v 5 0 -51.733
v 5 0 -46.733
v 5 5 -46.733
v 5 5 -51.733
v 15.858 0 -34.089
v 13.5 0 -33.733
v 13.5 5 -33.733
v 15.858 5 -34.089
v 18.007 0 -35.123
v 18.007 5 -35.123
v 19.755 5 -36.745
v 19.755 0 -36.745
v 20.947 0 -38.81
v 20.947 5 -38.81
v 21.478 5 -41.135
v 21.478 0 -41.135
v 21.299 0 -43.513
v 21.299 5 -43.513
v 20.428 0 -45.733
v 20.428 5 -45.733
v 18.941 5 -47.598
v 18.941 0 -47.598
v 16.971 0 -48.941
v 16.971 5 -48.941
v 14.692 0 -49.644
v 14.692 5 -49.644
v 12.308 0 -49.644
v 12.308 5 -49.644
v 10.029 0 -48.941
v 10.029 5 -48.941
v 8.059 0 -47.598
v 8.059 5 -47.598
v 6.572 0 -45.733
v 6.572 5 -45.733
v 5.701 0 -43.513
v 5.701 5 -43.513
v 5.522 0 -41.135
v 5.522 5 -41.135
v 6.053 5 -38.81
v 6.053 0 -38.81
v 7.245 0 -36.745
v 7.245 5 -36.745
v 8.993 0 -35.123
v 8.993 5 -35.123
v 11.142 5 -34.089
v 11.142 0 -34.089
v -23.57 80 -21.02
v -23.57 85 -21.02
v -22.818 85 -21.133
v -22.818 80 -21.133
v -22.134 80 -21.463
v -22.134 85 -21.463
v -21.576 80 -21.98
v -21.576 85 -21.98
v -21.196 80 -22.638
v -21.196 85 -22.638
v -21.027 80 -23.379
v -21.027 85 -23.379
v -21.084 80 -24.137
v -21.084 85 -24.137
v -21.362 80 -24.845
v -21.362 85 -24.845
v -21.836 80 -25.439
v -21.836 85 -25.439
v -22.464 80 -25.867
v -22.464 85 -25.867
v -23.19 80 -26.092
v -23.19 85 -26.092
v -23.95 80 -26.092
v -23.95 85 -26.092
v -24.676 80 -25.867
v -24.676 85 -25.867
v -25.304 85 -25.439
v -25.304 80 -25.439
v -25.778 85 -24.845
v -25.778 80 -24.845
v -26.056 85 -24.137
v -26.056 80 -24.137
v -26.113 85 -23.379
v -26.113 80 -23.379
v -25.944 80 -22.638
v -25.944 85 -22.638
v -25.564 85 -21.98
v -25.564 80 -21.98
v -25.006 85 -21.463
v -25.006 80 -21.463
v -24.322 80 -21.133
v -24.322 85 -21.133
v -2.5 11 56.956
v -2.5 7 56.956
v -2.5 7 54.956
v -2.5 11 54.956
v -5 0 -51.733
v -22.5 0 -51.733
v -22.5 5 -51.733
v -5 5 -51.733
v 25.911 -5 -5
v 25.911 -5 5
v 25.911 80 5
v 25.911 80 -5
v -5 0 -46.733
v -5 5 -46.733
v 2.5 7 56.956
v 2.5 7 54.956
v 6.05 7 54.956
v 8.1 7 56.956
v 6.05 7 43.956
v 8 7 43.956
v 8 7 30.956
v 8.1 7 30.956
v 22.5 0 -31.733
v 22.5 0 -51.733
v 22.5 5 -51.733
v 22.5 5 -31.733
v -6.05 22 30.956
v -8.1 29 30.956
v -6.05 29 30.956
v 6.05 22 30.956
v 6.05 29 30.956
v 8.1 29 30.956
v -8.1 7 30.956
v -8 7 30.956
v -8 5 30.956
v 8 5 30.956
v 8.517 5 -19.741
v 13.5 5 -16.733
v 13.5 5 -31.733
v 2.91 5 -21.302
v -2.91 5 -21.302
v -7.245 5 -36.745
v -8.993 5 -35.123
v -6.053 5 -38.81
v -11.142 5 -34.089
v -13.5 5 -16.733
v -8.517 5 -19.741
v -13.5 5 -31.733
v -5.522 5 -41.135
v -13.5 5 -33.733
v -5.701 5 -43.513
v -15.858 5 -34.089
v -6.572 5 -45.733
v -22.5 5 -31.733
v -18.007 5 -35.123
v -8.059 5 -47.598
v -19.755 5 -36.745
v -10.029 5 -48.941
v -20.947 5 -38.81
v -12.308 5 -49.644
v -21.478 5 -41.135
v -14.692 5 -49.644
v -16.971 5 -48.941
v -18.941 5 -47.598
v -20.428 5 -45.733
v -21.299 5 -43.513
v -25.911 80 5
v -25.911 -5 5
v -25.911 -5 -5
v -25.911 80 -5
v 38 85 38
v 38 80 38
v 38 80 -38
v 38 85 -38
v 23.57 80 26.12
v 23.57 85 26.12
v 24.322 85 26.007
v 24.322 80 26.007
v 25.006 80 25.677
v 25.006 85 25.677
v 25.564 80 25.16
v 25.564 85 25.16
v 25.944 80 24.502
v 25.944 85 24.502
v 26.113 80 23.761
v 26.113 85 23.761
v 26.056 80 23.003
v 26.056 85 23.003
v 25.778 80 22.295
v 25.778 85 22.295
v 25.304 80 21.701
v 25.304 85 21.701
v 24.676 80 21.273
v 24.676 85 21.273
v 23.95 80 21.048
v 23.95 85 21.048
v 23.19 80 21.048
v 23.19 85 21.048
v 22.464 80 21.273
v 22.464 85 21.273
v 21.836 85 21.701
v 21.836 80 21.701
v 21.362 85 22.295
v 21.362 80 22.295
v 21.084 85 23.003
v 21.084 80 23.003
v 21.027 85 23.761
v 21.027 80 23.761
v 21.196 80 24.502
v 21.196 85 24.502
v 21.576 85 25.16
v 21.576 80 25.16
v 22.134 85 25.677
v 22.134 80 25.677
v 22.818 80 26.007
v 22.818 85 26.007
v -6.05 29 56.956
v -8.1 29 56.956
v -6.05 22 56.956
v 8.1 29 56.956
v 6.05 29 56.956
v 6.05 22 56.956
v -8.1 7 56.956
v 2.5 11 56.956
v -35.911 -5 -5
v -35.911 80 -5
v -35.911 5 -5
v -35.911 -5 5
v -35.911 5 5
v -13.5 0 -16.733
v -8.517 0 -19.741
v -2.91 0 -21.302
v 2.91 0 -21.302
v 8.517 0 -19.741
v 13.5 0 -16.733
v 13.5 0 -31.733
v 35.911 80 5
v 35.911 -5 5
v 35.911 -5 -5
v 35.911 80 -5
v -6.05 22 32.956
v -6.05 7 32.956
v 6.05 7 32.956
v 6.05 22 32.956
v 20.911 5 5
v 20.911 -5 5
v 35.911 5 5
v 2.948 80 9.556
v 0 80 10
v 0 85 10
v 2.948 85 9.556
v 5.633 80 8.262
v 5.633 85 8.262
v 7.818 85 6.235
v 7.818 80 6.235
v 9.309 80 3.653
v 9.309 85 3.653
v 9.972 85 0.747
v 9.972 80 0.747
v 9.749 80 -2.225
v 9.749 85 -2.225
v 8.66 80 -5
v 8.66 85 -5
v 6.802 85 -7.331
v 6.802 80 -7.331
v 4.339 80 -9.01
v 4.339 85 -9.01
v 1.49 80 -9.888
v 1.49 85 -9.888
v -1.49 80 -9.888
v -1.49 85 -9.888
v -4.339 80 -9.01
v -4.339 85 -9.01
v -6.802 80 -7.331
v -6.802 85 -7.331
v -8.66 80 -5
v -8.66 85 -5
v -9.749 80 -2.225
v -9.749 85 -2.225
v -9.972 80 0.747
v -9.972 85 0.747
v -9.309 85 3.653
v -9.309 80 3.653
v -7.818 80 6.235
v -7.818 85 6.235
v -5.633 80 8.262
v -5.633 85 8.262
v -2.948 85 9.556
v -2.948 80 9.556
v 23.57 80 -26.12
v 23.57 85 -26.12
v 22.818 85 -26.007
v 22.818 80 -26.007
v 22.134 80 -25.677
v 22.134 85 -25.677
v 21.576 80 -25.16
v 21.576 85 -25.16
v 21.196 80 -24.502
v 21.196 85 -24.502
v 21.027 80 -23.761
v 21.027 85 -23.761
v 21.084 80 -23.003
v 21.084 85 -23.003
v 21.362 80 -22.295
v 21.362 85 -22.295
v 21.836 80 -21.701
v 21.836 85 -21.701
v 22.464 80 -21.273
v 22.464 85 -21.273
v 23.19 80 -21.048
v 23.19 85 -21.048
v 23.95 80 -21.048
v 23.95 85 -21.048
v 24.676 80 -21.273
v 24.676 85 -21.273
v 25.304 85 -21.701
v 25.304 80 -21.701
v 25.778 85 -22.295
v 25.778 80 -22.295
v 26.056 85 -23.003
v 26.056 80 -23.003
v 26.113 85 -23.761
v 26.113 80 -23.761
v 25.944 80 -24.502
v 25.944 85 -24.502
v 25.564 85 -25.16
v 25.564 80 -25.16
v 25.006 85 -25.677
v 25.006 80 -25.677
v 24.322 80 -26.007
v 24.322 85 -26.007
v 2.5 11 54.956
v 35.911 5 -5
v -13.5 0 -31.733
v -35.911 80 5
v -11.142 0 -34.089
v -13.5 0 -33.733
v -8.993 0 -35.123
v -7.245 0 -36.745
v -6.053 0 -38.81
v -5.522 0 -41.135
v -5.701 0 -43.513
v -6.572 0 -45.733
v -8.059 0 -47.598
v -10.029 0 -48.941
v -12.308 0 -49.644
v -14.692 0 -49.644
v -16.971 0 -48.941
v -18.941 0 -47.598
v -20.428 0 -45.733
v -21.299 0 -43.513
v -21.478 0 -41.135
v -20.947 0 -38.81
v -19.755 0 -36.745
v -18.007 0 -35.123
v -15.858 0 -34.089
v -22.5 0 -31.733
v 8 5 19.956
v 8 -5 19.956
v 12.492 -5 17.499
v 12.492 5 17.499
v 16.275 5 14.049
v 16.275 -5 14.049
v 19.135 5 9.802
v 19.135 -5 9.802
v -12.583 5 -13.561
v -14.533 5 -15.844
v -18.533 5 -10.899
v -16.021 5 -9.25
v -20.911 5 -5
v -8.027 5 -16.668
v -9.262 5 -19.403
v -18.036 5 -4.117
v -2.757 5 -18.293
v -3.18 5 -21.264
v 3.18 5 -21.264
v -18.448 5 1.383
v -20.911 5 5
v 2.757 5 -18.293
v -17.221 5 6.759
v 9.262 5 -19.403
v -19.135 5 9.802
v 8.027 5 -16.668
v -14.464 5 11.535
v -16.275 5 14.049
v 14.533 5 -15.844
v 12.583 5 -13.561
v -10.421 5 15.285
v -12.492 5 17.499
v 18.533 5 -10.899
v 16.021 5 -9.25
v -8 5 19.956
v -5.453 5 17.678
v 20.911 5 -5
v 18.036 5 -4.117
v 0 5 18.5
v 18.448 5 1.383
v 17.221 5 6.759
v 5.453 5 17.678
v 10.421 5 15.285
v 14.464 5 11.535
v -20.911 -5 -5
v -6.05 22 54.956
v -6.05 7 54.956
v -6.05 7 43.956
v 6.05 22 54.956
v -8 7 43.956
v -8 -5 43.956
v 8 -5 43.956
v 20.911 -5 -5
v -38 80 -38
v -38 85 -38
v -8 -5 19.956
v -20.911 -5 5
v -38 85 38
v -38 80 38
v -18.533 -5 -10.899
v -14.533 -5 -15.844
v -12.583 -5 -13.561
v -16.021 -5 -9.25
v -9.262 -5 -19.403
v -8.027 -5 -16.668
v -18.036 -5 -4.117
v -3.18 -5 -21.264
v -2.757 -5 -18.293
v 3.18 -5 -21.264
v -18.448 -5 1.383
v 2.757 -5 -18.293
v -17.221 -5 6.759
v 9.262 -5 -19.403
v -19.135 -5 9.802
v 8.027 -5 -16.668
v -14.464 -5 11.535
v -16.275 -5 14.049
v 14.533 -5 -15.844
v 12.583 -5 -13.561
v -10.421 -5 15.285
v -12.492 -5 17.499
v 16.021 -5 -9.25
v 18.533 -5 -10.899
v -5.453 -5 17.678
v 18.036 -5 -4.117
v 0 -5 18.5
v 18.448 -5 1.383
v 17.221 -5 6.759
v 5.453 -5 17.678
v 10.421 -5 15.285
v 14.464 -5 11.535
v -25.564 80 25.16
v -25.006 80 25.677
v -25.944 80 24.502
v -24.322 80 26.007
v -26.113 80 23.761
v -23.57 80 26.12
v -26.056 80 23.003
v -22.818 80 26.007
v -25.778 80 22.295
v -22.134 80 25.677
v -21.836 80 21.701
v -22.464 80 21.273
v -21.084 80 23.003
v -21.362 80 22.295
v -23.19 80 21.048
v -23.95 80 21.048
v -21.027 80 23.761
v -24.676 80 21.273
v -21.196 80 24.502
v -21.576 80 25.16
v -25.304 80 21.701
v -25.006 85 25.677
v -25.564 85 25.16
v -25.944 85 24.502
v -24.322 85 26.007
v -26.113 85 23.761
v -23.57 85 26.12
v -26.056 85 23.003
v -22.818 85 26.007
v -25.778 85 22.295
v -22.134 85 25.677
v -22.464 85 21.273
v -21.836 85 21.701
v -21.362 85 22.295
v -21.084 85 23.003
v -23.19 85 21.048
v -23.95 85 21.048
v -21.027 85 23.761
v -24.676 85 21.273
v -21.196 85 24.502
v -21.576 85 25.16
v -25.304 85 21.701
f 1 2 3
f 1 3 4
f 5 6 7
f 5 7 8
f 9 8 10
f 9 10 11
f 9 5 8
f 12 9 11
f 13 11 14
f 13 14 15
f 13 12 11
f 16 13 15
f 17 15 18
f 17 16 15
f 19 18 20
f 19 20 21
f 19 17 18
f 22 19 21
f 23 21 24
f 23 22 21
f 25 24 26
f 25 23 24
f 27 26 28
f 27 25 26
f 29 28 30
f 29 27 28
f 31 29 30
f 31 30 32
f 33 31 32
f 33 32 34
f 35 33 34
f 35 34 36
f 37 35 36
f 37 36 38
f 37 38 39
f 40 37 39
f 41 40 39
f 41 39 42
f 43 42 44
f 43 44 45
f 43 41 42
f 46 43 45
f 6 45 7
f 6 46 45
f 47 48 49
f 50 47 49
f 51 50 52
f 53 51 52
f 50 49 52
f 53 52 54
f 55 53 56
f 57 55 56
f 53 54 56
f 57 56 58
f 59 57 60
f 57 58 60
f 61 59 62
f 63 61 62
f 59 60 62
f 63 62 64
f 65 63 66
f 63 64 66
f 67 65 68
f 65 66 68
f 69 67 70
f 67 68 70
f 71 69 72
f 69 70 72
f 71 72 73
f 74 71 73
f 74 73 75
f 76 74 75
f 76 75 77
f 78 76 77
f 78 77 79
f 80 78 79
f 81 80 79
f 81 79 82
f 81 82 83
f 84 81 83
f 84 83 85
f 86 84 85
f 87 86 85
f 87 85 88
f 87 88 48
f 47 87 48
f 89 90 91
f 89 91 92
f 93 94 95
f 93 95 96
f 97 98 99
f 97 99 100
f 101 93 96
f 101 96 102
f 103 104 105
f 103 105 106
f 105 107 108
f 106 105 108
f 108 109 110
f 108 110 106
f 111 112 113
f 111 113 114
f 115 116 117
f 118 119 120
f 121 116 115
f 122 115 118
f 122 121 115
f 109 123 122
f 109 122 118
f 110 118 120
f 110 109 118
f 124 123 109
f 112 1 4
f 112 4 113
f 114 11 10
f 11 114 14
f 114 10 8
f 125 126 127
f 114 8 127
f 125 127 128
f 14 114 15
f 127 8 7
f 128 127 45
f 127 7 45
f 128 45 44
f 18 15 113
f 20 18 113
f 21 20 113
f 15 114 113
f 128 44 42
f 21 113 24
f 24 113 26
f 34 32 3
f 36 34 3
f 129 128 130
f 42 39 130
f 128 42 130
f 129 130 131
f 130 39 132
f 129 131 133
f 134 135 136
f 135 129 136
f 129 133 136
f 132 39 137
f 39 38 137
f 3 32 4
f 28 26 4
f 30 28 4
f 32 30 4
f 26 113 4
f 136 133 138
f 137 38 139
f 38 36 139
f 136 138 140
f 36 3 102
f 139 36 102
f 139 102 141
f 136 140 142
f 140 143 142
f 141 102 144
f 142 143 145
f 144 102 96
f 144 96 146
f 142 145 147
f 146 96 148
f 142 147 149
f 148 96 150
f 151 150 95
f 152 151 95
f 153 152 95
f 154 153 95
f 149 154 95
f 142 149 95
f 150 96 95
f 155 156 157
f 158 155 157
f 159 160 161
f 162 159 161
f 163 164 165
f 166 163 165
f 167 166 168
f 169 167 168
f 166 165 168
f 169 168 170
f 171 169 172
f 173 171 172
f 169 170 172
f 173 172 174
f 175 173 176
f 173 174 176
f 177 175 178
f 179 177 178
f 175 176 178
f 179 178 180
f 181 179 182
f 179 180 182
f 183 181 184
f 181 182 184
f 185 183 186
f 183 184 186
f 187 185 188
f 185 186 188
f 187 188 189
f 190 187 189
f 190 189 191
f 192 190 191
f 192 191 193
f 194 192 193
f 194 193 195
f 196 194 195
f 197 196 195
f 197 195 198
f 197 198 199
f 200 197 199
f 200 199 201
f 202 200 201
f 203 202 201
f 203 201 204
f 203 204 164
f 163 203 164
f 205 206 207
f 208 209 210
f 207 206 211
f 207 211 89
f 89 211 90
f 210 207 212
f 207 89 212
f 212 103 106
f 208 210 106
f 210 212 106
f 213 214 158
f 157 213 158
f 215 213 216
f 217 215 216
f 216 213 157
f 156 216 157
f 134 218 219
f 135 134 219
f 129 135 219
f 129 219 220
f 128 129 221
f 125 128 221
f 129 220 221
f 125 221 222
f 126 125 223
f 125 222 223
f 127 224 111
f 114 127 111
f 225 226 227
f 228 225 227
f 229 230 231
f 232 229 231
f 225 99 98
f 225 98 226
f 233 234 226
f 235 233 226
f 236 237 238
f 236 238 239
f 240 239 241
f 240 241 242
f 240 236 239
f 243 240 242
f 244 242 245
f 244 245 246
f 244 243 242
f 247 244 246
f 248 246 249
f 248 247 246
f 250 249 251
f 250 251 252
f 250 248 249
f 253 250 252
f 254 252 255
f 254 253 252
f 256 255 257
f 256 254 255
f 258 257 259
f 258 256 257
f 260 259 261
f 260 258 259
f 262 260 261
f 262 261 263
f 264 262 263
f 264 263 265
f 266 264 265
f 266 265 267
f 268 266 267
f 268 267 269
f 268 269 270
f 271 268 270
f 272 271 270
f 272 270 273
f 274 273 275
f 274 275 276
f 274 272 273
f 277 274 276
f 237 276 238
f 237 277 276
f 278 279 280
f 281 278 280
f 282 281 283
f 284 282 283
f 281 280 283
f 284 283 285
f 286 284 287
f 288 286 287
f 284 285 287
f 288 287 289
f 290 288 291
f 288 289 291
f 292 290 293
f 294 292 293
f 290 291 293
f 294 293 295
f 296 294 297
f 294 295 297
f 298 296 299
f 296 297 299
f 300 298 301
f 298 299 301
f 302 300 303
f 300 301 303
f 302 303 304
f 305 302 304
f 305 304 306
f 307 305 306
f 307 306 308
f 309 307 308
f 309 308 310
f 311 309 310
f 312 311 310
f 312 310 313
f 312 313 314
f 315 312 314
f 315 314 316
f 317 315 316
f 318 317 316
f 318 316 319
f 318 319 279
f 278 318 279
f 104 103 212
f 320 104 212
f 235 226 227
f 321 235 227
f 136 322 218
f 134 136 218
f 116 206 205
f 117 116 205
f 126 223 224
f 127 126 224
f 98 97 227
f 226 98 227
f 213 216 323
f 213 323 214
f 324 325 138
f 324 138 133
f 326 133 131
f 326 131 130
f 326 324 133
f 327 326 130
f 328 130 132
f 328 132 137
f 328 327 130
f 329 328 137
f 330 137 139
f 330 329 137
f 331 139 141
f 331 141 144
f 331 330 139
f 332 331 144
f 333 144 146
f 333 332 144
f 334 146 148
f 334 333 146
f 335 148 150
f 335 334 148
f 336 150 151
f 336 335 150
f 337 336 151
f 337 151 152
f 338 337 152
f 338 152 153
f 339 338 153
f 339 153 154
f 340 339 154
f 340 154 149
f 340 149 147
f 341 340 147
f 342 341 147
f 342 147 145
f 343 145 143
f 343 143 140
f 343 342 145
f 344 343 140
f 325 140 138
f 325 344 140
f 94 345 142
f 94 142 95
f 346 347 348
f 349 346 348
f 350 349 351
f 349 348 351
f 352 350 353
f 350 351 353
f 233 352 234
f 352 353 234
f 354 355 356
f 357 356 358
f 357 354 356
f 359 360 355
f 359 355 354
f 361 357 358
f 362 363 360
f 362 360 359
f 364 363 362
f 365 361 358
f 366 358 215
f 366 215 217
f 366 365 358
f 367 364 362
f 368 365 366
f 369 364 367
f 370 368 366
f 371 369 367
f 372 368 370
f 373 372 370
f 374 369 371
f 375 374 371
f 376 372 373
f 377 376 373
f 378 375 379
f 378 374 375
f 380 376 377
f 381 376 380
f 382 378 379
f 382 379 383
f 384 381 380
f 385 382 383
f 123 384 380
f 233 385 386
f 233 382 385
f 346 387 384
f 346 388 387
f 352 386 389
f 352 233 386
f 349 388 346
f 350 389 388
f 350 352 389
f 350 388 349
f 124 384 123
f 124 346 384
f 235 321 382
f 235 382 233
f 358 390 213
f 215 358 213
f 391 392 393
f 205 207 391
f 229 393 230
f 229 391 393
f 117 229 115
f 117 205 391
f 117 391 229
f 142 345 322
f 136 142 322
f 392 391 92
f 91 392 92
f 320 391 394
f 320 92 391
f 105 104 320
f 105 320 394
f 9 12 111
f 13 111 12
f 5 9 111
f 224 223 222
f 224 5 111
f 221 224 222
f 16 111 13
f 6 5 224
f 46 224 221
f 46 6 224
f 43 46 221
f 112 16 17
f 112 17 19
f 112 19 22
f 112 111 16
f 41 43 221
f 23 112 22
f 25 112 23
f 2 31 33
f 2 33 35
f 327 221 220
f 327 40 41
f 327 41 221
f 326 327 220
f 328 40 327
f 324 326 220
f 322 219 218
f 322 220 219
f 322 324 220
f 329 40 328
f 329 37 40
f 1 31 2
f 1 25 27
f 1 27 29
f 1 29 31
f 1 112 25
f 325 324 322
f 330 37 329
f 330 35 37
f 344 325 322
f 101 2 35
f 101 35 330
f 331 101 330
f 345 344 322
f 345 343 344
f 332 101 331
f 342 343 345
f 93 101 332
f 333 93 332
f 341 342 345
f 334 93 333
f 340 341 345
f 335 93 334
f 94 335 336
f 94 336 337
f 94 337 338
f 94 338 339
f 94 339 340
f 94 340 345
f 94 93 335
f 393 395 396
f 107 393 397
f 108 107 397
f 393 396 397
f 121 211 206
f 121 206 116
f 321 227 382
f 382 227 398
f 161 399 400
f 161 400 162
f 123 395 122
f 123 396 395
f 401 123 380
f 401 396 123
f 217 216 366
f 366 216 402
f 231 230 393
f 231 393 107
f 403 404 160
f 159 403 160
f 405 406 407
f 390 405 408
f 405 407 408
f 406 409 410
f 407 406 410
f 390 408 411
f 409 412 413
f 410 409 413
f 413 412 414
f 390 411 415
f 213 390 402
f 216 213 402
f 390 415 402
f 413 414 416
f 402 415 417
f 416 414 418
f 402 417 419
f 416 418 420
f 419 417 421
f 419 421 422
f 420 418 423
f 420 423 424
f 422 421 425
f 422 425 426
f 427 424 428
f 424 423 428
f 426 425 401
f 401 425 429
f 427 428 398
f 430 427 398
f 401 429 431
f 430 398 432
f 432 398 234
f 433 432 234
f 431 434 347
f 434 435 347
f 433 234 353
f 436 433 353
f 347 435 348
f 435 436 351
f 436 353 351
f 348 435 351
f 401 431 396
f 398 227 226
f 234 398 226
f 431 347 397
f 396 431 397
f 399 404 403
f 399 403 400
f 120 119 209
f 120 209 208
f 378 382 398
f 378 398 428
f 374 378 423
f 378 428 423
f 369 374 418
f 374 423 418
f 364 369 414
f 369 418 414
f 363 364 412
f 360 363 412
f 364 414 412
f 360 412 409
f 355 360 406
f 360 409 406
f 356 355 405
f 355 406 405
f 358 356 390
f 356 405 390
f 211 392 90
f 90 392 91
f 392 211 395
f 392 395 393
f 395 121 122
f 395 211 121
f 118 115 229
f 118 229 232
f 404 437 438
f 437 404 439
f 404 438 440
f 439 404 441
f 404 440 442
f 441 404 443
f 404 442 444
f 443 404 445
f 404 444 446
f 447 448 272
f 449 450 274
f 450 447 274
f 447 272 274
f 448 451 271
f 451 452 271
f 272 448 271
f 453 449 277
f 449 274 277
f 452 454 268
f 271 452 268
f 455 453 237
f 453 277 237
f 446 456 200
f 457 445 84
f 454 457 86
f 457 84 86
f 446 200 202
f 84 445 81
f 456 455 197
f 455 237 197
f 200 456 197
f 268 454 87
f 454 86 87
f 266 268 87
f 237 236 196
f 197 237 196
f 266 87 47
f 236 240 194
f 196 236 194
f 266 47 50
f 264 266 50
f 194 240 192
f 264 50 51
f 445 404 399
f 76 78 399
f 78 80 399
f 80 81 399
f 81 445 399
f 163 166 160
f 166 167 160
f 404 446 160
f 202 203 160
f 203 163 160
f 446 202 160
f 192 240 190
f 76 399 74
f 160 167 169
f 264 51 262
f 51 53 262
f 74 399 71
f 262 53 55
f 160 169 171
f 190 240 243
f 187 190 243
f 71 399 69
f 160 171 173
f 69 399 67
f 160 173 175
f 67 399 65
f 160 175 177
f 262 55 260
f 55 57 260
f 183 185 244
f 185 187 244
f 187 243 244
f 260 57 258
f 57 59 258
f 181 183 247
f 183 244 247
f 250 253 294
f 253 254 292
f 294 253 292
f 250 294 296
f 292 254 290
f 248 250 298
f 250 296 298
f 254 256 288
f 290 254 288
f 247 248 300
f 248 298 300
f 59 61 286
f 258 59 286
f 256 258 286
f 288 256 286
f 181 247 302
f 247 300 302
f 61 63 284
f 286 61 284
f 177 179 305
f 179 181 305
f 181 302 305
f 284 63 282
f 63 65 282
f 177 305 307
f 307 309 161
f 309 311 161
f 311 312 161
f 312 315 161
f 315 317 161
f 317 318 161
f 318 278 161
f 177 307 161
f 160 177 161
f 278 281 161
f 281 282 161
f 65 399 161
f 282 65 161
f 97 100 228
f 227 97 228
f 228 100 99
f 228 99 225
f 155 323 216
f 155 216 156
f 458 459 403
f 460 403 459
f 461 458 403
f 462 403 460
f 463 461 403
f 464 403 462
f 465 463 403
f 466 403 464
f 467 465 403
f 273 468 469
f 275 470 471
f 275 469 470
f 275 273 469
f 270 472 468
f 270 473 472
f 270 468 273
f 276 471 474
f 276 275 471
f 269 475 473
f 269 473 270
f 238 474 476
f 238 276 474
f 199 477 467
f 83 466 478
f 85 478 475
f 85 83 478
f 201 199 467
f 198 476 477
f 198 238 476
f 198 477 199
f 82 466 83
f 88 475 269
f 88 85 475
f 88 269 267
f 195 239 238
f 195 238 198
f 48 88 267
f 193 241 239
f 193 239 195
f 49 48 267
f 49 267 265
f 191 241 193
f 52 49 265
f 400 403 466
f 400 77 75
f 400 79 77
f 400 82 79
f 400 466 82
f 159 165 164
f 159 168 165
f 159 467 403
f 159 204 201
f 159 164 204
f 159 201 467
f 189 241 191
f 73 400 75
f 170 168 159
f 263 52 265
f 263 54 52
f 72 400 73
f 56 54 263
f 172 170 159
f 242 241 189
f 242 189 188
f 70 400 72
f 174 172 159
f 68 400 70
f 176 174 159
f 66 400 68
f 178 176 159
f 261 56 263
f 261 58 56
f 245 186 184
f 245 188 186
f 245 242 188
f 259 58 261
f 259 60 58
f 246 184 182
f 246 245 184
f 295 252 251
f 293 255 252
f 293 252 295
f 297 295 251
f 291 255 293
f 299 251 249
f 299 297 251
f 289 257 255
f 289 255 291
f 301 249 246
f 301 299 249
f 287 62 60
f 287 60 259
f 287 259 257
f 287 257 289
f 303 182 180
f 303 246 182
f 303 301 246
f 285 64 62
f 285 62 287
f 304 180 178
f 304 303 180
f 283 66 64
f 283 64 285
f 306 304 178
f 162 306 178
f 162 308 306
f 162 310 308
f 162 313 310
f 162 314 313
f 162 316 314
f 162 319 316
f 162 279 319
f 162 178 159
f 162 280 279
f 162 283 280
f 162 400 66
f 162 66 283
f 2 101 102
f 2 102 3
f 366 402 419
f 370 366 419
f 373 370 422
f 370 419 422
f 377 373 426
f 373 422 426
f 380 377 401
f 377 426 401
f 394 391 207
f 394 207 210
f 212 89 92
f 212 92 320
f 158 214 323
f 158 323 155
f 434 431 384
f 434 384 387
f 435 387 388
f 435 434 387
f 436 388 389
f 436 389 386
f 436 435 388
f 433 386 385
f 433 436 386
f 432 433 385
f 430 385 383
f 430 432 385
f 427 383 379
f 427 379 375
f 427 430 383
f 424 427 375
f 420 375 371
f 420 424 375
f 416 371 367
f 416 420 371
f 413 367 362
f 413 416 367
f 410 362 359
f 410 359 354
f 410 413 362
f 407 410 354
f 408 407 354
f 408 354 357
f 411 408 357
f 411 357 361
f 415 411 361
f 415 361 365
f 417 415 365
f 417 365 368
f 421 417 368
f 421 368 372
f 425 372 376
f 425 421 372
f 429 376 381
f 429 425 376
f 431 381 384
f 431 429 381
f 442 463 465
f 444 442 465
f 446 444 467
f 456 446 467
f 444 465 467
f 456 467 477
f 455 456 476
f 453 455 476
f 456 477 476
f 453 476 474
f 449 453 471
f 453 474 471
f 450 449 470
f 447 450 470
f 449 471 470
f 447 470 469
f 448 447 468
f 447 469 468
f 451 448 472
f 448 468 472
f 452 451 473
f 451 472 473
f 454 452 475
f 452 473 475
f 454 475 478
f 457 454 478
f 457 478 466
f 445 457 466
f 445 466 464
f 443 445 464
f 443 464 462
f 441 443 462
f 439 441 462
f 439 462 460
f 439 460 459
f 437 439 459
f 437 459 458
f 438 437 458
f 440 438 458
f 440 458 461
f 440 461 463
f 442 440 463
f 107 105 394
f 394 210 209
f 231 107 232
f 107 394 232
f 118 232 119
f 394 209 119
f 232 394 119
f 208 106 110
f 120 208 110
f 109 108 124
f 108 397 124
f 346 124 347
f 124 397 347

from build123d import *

# Parameters (mm, degrees)
CONNECTOR_SLEEVE_DEPTH      = 5
CONNECTOR_SLEEVE_DEPTH_BACK = 5
SKETCH2_R                   = 18.5
SKETCH2_10_R                = 8
SENSOR_HOLDER_DEPTH         = 5
ARMS_START                  = -5
SKETCH2_18_W                = 10
SKETCH2_18_H                = 10
ARMS_DEPTH                  = 85
ARMS_2_DEPTH                = 85
ARMS2_START                 = -5
ARMS2_DEPTH                 = 10
SERVOHOLDER_START           = -5
SERVOHOLDER_DEPTH           = 10
SKETCH31_W                  = 16
SKETCH31_H                  = 13
SERVOHOLDER2_DEPTH          = 2
SKETCH33_W                  = 16.2
SKETCH33_H                  = 26
SKETCH33_W_2                = 12.1
SKETCH33_H_2                = 22
SERVOHOLDER3_DEPTH          = 22
SERVOHOLDER4_W              = 12.1
SERVOHOLDER4_H              = 2
SERVOGROOVES_DEPTH          = 7
SKETCH36_W                  = 5
SKETCH36_H                  = 4
SERVOWIRING_DEPTH           = 2
SKETCH4_W                   = 76
SKETCH4_H                   = 76
SKETCH4_R                   = 10
MOTOR_ENCLOSURE_DEPTH       = 5
SKETCH6_R                   = 2.55
CUT_EXTRUDE1_DEPTH          = 10


with BuildPart() as part:
    # Sketch2 → Connector sleeve (new, two sides: drawn at the far end of the back side and taken through both)
    with BuildSketch(Plane(origin=(0, 0, 0), x_dir=(1, 0, 0), z_dir=(0, 1, 0)).offset(-CONNECTOR_SLEEVE_DEPTH_BACK)):
        with BuildLine():
            ThreePointArc((-13.5, 16.733200531), (-18.177954599, 11.480939273), (-20.910523666, 5))
            ThreePointArc((-20.910523666, 5), (-21.5, 0), (-20.910523666, -5))
            ThreePointArc((-20.910523666, -5), (-16.275029633, -14.048964746), (-8, -19.956202043))
            ThreePointArc((-8, -19.956202043), (0, -21.5), (8, -19.956202043))
            ThreePointArc((8, -19.956202043), (16.275029633, -14.048964746), (20.910523666, -5))
            ThreePointArc((20.910523666, -5), (21.352122363, -2.517314161), (21.5, 0))
            ThreePointArc((21.5, 0), (21.352122363, 2.517314161), (20.910523666, 5))
            ThreePointArc((20.910523666, 5), (18.177954599, 11.480939273), (13.5, 16.733200531))
            ThreePointArc((13.5, 16.733200531), (0, 21.5), (-13.5, 16.733200531))
        make_face()
        Circle(SKETCH2_R, mode=Mode.SUBTRACT)
    extrude(amount=CONNECTOR_SLEEVE_DEPTH + CONNECTOR_SLEEVE_DEPTH_BACK)

    # Sketch2<22> → Arms2 (add)
    with BuildSketch(Plane(origin=(0, 0, 0), x_dir=(1, 0, 0), z_dir=(0, 1, 0)).offset(ARMS2_START)):
        with BuildLine():
            ThreePointArc((-20.910523666, -5), (-21.5, 0), (-20.910523666, 5))
            Line((-20.910523666, 5), (-35.910523666, 5))
            Line((-35.910523666, 5), (-35.910523666, -5))
            Line((-35.910523666, -5), (-20.910523666, -5))
        make_face()
        with BuildLine():
            ThreePointArc((20.910523666, 5), (21.5, 0), (20.910523666, -5))
            Line((20.910523666, -5), (35.910523666, -5))
            Line((35.910523666, -5), (35.910523666, 5))
            Line((35.910523666, 5), (20.910523666, 5))
        make_face()
    extrude(amount=ARMS2_DEPTH)

    # Sketch2<21> → Servoholder (add)
    with BuildSketch(Plane(origin=(0, 0, 0), x_dir=(1, 0, 0), z_dir=(0, 1, 0)).offset(SERVOHOLDER_START)):
        with BuildLine():
            ThreePointArc((8, -19.956202043), (0, -21.5), (-8, -19.956202043))
            Line((-8, -19.956202043), (-8, -43.956202043))
            Line((-8, -43.956202043), (8, -43.956202043))
            Line((8, -43.956202043), (8, -19.956202043))
        make_face()
    extrude(amount=SERVOHOLDER_DEPTH)

    # Sketch31 → Servoholder2 (add)
    with BuildSketch(Plane(origin=(0, 5, 0), x_dir=(1, 0, 0), z_dir=(0, 1, 0))):
        with Locations((0, -37.456202043)):
            Rectangle(SKETCH31_W, SKETCH31_H)
    extrude(amount=SERVOHOLDER2_DEPTH)

    # Sketch33 → Servoholder3 (add)
    with BuildSketch(Plane(origin=(0, 7, 0), x_dir=(1, 0, 0), z_dir=(0, 1, 0))):
        with Locations((0, -43.956202043)):
            Rectangle(SKETCH33_W, SKETCH33_H)
        with Locations((0, -43.956202043)):
            Rectangle(SKETCH33_W_2, SKETCH33_H_2, mode=Mode.SUBTRACT)
    extrude(amount=SERVOHOLDER3_DEPTH)

    # Servoholder4 → Servogrooves (cut)
    with BuildSketch(Plane(origin=(0, 29, 0), x_dir=(1, 0, 0), z_dir=(0, 1, 0))):
        with Locations((0, -31.956202043)):
            Rectangle(SERVOHOLDER4_W, SERVOHOLDER4_H)
        with Locations((0, -55.956202043)):
            Rectangle(SERVOHOLDER4_W, SERVOHOLDER4_H)
    extrude(amount=-SERVOGROOVES_DEPTH, mode=Mode.SUBTRACT)

    # Sketch36 → Servowiring (cut)
    with BuildSketch(Plane.XY.offset(56.956202043)):
        with Locations((0, 9)):
            Rectangle(SKETCH36_W, SKETCH36_H)
    extrude(amount=-SERVOWIRING_DEPTH, mode=Mode.SUBTRACT)


with BuildPart() as body_2:
    # Sketch2<10> → Sensor holder (new body)
    with BuildSketch(Plane(origin=(0, 0, 0), x_dir=(1, 0, 0), z_dir=(0, 1, 0))):
        with BuildLine():
            Line((-13.5, 31.733200531), (-13.5, 16.733200531))
            ThreePointArc((-13.5, 16.733200531), (0, 21.5), (13.5, 16.733200531))
            Line((13.5, 16.733200531), (13.5, 31.733200531))
            Line((13.5, 31.733200531), (22.5, 31.733200531))
            Line((22.5, 31.733200531), (22.5, 51.733200531))
            Line((22.5, 51.733200531), (5, 51.733200531))
            Line((5, 51.733200531), (5, 46.733200531))
            Line((5, 46.733200531), (-5, 46.733200531))
            Line((-5, 46.733200531), (-5, 51.733200531))
            Line((-5, 51.733200531), (-22.5, 51.733200531))
            Line((-22.5, 51.733200531), (-22.5, 31.733200531))
            Line((-22.5, 31.733200531), (-13.5, 31.733200531))
        make_face()
        with Locations((-13.5, 41.733200531)):
            Circle(SKETCH2_10_R, mode=Mode.SUBTRACT)
        with Locations((13.5, 41.733200531)):
            Circle(SKETCH2_10_R, mode=Mode.SUBTRACT)
    extrude(amount=SENSOR_HOLDER_DEPTH)


with BuildPart() as body_3:
    # Sketch2<18> → Arms (new body)
    with BuildSketch(Plane(origin=(0, 0, 0), x_dir=(1, 0, 0), z_dir=(0, 1, 0)).offset(ARMS_START)):
        with Locations((-30.910523666, 0)):
            Rectangle(SKETCH2_18_W, SKETCH2_18_H)
    extrude(amount=ARMS_DEPTH)


with BuildPart() as body_4:
    # Sketch2<18> → Arms 2 (new body)
    with BuildSketch(Plane(origin=(0, 0, 0), x_dir=(1, 0, 0), z_dir=(0, 1, 0)).offset(ARMS_START)):
        with Locations((30.910523666, 0)):
            Rectangle(SKETCH2_18_W, SKETCH2_18_H)
    extrude(amount=ARMS_2_DEPTH)


with BuildPart() as body_5:
    # Sketch4 → Motor enclosure (new body)
    with BuildSketch(Plane(origin=(0, 80, 0), x_dir=(1, 0, 0), z_dir=(0, 1, 0))):
        Rectangle(SKETCH4_W, SKETCH4_H)
        Circle(SKETCH4_R, mode=Mode.SUBTRACT)
    extrude(amount=MOTOR_ENCLOSURE_DEPTH)

    # Sketch6 → Cut-Extrude1 (cut)
    with BuildSketch(Plane(origin=(0, 85, 0), x_dir=(1, 0, 0), z_dir=(0, 1, 0))):
        with Locations((23.57, -23.57)):
            Circle(SKETCH6_R)
        with Locations((-23.57, -23.57)):
            Circle(SKETCH6_R)
        with Locations((-23.57, 23.57)):
            Circle(SKETCH6_R)
        with Locations((23.57, 23.57)):
            Circle(SKETCH6_R)
    extrude(amount=-CUT_EXTRUDE1_DEPTH, mode=Mode.SUBTRACT)


solid = Compound([part.part, body_2.part, body_3.part, body_4.part, body_5.part])
